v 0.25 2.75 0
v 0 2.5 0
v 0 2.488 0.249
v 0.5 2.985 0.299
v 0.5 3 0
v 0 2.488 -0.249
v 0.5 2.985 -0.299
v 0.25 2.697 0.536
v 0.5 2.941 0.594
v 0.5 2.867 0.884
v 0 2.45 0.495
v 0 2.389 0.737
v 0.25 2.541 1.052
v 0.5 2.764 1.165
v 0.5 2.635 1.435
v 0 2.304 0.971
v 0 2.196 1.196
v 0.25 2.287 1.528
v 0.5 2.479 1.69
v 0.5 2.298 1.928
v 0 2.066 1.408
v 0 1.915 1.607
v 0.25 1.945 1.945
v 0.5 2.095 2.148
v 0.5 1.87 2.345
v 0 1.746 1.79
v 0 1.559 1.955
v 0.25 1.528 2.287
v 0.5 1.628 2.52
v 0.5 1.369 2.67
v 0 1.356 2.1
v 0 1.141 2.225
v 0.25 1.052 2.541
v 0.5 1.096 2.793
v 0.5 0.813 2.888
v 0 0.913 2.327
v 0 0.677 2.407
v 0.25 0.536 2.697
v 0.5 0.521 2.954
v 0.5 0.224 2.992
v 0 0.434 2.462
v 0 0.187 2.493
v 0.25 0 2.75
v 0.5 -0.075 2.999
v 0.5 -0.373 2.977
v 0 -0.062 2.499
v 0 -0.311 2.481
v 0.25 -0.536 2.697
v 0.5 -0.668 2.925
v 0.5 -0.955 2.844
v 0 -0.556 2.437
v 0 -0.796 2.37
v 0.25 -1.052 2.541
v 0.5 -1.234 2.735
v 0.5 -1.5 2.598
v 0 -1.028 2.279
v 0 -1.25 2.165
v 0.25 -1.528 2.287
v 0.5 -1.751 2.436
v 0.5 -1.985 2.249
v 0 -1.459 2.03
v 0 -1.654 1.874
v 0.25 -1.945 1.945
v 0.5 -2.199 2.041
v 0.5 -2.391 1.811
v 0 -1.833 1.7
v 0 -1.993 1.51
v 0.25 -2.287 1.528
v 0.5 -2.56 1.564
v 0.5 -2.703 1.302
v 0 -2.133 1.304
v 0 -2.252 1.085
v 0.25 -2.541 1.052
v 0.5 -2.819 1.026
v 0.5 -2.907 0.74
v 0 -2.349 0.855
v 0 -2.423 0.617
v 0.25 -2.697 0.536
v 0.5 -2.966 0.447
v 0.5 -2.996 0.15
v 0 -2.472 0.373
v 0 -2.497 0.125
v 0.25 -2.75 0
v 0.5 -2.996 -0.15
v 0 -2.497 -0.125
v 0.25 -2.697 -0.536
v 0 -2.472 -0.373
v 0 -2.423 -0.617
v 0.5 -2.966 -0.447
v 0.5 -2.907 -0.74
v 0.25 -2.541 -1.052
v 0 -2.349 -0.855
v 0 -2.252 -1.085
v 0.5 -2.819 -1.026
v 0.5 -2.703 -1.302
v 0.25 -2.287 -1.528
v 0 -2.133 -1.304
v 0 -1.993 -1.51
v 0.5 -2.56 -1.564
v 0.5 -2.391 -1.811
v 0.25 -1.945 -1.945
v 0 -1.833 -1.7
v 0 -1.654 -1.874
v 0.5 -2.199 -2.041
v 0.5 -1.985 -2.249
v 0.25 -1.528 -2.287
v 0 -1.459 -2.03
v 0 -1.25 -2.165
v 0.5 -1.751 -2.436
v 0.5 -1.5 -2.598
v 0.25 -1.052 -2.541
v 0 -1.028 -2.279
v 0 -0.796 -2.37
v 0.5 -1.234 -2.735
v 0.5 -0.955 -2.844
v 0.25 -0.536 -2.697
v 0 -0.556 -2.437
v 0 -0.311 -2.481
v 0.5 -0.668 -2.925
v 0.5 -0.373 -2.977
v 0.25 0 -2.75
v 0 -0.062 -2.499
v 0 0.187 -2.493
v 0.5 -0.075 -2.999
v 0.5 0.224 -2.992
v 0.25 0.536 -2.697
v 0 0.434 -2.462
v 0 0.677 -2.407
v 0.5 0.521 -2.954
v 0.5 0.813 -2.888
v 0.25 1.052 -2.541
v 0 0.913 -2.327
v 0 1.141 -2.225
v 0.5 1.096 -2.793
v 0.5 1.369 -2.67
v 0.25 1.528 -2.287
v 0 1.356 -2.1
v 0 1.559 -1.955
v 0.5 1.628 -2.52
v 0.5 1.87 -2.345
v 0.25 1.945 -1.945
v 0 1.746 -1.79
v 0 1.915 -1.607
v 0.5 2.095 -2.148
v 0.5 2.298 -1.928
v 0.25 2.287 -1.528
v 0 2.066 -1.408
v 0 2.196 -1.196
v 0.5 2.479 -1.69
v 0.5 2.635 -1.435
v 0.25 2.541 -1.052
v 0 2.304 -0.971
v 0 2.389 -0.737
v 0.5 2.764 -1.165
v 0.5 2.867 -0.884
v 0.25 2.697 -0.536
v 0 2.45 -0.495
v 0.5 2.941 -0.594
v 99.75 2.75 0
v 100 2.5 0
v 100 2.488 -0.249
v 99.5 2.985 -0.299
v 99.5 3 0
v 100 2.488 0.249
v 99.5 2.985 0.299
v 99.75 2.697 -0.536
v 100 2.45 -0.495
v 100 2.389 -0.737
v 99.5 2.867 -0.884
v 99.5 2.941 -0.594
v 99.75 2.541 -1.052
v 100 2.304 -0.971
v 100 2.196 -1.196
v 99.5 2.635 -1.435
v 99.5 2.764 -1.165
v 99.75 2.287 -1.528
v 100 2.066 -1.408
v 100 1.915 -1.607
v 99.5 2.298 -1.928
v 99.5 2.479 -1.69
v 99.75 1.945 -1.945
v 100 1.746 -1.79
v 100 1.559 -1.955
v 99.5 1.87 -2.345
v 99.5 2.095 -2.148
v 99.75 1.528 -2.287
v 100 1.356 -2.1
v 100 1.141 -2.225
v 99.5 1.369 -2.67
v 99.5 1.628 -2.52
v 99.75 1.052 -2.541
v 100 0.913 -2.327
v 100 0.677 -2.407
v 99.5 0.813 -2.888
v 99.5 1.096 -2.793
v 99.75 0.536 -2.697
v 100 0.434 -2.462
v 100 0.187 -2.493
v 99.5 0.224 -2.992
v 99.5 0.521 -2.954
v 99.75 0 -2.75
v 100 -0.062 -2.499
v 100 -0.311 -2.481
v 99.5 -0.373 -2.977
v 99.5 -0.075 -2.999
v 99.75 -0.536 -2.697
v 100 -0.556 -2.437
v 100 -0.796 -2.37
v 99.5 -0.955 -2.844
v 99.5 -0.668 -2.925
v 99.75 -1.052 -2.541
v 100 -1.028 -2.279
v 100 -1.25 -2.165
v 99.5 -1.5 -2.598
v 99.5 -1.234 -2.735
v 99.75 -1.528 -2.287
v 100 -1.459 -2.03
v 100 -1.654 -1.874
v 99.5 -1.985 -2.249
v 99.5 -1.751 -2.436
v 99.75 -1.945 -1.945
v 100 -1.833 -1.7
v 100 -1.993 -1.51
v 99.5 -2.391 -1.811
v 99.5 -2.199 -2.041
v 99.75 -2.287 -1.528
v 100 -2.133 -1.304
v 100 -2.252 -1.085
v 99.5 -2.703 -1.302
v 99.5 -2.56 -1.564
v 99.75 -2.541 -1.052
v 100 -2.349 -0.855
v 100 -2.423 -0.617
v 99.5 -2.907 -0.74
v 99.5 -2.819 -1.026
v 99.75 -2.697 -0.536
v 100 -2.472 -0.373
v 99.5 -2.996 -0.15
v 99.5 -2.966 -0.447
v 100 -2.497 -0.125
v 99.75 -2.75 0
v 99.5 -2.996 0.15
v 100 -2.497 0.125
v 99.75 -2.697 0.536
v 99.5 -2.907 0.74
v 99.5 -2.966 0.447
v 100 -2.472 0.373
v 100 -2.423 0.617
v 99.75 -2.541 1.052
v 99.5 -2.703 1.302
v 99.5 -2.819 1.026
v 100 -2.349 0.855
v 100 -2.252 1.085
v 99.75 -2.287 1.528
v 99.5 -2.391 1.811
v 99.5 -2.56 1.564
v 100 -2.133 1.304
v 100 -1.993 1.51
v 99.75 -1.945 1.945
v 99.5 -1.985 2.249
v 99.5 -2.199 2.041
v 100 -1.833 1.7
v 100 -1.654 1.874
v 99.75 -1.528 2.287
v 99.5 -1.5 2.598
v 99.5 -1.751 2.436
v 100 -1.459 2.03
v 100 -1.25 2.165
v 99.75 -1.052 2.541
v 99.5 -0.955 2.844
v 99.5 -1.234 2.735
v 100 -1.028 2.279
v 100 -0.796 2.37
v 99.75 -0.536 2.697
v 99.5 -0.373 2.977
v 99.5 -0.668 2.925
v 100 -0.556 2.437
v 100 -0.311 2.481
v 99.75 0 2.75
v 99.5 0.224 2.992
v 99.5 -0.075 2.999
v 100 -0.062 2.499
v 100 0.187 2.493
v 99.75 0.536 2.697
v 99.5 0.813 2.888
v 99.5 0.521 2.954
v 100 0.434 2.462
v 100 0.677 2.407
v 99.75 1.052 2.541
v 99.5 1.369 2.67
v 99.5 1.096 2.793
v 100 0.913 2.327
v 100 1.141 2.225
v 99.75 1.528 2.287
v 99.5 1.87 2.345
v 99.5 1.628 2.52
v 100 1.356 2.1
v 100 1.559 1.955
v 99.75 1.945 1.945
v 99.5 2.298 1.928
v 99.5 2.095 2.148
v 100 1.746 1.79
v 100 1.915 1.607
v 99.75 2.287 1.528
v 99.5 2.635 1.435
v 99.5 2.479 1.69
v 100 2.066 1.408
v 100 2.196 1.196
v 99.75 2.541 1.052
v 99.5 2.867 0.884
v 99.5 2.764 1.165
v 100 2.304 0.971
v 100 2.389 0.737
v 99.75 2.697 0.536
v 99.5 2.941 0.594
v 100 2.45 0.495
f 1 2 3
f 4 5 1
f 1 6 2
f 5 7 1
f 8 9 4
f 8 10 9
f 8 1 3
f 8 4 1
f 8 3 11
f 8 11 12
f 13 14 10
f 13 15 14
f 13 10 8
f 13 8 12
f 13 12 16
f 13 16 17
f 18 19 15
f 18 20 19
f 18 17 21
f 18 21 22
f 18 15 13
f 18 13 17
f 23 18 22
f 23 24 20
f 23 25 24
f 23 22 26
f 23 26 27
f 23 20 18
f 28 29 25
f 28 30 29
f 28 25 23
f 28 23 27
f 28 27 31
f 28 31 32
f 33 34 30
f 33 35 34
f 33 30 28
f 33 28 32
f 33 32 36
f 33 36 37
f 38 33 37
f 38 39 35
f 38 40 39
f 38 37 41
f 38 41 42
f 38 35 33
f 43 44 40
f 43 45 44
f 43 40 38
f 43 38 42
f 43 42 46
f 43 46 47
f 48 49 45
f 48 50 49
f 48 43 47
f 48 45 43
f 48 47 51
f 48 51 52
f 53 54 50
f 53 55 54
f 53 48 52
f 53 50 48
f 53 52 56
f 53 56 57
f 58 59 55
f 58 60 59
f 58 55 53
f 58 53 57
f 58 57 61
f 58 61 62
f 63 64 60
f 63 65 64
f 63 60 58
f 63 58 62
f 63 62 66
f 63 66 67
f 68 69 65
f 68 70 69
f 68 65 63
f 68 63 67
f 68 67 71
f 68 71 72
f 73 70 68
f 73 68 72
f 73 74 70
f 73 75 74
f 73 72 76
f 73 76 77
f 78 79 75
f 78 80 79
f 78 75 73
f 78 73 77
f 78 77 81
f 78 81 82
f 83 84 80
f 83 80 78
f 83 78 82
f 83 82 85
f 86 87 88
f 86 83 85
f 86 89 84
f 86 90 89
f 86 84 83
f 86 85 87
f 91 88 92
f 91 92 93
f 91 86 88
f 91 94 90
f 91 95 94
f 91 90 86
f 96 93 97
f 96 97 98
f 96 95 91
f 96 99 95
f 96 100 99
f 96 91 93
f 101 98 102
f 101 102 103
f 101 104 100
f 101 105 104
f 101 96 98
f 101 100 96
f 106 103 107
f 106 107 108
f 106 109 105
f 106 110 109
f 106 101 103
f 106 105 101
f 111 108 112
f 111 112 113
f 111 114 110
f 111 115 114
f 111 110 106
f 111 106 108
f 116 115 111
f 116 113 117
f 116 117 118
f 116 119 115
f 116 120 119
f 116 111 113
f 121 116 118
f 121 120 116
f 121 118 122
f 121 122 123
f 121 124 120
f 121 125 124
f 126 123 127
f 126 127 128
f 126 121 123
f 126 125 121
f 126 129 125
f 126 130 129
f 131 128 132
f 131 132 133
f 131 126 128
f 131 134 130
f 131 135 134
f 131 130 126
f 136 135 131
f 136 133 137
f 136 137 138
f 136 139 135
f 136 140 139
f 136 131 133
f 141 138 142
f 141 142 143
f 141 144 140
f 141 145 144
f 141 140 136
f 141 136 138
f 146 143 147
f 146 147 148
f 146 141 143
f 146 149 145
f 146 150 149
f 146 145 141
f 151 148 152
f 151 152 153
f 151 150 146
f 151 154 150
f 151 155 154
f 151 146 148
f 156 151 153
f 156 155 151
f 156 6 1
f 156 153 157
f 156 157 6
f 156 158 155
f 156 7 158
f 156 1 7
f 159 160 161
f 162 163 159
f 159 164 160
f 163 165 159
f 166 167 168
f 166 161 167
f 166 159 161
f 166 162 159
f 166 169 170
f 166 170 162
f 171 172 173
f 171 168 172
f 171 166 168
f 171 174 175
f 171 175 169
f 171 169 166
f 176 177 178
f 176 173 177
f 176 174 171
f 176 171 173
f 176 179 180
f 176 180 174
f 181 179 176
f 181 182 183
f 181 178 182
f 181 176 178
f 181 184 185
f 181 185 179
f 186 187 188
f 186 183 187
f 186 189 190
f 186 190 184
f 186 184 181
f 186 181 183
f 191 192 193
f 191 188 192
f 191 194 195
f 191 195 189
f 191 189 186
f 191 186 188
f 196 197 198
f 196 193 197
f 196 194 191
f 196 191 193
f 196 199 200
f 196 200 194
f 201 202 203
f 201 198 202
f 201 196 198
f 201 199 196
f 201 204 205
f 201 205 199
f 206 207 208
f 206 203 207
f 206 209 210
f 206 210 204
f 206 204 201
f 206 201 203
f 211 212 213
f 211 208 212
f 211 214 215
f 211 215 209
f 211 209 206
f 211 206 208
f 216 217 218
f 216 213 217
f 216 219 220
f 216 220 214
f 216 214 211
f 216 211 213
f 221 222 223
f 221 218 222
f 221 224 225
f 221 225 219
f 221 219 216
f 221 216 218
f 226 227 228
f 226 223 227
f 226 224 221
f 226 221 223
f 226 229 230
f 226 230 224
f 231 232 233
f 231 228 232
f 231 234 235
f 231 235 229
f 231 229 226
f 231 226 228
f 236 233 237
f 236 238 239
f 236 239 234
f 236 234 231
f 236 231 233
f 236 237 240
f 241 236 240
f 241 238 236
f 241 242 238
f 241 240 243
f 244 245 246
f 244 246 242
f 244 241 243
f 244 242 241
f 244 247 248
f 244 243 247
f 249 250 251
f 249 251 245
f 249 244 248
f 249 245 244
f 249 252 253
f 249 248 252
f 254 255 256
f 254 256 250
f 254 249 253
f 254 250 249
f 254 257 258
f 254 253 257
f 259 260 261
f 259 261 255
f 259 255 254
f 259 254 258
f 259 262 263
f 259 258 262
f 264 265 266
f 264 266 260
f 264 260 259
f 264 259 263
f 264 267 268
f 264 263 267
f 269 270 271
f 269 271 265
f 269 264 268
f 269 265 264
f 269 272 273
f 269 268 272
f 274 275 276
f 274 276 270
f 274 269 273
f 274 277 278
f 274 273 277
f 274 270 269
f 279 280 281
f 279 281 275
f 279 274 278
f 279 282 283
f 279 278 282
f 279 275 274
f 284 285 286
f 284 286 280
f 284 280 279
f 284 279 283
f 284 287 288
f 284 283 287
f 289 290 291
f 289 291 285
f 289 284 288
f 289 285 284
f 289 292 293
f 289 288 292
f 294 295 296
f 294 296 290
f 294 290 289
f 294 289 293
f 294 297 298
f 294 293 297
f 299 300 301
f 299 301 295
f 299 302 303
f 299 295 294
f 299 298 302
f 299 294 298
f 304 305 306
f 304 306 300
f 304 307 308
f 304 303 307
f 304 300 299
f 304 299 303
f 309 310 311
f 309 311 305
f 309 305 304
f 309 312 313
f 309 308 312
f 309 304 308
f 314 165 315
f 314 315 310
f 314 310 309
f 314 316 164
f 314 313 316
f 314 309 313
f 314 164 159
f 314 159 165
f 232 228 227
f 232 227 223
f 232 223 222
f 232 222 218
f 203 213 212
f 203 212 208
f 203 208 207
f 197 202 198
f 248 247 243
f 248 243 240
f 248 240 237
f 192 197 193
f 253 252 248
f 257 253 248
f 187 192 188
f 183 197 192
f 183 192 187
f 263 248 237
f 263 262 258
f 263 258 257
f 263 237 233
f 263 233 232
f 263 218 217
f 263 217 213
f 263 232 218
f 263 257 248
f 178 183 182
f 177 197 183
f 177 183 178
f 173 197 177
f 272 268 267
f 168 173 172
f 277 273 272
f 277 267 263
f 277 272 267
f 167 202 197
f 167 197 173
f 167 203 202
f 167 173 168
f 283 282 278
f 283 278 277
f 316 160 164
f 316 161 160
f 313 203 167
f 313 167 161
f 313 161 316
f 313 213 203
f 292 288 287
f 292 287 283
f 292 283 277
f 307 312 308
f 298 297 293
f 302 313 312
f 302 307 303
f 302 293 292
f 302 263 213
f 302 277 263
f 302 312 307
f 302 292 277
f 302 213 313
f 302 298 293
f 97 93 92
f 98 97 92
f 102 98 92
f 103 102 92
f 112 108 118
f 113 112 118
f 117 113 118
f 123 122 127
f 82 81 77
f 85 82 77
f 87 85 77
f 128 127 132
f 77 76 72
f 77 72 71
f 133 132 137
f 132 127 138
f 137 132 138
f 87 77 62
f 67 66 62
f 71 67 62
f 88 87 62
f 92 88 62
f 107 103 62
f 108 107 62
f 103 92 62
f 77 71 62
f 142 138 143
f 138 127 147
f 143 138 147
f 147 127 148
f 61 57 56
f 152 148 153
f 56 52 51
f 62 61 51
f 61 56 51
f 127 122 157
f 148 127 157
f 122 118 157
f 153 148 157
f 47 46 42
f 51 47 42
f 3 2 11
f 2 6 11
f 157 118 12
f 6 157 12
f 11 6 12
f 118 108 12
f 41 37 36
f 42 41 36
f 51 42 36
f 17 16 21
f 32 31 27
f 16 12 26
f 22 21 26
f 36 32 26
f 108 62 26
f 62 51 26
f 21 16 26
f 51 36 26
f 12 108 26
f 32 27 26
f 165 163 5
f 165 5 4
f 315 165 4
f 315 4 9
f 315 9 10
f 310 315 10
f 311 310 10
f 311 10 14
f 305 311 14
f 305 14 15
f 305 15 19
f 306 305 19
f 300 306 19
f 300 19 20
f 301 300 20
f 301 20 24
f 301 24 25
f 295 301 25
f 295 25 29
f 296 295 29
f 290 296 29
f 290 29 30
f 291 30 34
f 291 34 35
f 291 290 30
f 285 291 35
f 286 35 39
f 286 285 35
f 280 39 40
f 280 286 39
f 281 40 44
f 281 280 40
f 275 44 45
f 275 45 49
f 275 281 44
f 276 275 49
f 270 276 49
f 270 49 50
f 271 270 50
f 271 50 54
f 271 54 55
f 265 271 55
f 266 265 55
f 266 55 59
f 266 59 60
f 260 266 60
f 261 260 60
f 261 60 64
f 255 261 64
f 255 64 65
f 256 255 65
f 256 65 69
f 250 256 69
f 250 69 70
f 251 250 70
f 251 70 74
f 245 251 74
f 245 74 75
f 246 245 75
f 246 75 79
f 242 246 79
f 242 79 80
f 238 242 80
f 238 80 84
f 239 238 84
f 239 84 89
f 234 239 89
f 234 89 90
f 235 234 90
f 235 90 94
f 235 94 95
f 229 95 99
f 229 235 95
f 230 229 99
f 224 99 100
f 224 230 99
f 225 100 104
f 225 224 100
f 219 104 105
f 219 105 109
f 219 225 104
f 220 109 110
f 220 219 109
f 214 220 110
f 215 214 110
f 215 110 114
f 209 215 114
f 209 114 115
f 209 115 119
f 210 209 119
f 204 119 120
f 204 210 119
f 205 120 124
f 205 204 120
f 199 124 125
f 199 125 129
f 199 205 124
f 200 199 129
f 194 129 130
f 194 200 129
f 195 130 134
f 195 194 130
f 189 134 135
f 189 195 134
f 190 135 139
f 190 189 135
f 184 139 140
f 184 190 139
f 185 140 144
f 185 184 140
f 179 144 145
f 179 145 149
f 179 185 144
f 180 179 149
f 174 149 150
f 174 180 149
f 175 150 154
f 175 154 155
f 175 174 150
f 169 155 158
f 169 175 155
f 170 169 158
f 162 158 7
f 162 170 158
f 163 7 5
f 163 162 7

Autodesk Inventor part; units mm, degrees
ref_plane "Startebene" through (0, 0, 0) normal (1, 0, 0) x (0, 1, 0)
ref_plane "XZ Plane" through (0, 0, 0) normal (0, 1, 0) x (-1, 0, 0)
ref_plane "XY Plane" through (0, 0, 0) normal (0, 0, 1) x (1, 0, 0)
sketch "Hauptskizze" plane through (0, 0, 0) normal (0, 0, 1) x (1, 0, 0)
  line L0 (0, 0) -> (100, 0)
  line L1 (0, 0) -> (0, 3)
  line L2 (100, 3) -> (100, 0)
  line L3 (0, 3) -> (100, 3)
  dimension "d3" = 6
revolve "Umdrehung1" add sketch "Hauptskizze" angle 360 about axis through (0, 0, 0) along (1, 0, 0)
chamfer "Fase3" distance 0.5 angle 45 1 edges at (0, -3, 0) measured on face at (66.6667, 2.9612, -0.4812)
chamfer "Fase2" distance 0.5 angle 45 1 edges at (100, -3, 0) measured on face at (33.6667, 2.9612, -0.4812)
properties part number "Welle" material "Steel"
